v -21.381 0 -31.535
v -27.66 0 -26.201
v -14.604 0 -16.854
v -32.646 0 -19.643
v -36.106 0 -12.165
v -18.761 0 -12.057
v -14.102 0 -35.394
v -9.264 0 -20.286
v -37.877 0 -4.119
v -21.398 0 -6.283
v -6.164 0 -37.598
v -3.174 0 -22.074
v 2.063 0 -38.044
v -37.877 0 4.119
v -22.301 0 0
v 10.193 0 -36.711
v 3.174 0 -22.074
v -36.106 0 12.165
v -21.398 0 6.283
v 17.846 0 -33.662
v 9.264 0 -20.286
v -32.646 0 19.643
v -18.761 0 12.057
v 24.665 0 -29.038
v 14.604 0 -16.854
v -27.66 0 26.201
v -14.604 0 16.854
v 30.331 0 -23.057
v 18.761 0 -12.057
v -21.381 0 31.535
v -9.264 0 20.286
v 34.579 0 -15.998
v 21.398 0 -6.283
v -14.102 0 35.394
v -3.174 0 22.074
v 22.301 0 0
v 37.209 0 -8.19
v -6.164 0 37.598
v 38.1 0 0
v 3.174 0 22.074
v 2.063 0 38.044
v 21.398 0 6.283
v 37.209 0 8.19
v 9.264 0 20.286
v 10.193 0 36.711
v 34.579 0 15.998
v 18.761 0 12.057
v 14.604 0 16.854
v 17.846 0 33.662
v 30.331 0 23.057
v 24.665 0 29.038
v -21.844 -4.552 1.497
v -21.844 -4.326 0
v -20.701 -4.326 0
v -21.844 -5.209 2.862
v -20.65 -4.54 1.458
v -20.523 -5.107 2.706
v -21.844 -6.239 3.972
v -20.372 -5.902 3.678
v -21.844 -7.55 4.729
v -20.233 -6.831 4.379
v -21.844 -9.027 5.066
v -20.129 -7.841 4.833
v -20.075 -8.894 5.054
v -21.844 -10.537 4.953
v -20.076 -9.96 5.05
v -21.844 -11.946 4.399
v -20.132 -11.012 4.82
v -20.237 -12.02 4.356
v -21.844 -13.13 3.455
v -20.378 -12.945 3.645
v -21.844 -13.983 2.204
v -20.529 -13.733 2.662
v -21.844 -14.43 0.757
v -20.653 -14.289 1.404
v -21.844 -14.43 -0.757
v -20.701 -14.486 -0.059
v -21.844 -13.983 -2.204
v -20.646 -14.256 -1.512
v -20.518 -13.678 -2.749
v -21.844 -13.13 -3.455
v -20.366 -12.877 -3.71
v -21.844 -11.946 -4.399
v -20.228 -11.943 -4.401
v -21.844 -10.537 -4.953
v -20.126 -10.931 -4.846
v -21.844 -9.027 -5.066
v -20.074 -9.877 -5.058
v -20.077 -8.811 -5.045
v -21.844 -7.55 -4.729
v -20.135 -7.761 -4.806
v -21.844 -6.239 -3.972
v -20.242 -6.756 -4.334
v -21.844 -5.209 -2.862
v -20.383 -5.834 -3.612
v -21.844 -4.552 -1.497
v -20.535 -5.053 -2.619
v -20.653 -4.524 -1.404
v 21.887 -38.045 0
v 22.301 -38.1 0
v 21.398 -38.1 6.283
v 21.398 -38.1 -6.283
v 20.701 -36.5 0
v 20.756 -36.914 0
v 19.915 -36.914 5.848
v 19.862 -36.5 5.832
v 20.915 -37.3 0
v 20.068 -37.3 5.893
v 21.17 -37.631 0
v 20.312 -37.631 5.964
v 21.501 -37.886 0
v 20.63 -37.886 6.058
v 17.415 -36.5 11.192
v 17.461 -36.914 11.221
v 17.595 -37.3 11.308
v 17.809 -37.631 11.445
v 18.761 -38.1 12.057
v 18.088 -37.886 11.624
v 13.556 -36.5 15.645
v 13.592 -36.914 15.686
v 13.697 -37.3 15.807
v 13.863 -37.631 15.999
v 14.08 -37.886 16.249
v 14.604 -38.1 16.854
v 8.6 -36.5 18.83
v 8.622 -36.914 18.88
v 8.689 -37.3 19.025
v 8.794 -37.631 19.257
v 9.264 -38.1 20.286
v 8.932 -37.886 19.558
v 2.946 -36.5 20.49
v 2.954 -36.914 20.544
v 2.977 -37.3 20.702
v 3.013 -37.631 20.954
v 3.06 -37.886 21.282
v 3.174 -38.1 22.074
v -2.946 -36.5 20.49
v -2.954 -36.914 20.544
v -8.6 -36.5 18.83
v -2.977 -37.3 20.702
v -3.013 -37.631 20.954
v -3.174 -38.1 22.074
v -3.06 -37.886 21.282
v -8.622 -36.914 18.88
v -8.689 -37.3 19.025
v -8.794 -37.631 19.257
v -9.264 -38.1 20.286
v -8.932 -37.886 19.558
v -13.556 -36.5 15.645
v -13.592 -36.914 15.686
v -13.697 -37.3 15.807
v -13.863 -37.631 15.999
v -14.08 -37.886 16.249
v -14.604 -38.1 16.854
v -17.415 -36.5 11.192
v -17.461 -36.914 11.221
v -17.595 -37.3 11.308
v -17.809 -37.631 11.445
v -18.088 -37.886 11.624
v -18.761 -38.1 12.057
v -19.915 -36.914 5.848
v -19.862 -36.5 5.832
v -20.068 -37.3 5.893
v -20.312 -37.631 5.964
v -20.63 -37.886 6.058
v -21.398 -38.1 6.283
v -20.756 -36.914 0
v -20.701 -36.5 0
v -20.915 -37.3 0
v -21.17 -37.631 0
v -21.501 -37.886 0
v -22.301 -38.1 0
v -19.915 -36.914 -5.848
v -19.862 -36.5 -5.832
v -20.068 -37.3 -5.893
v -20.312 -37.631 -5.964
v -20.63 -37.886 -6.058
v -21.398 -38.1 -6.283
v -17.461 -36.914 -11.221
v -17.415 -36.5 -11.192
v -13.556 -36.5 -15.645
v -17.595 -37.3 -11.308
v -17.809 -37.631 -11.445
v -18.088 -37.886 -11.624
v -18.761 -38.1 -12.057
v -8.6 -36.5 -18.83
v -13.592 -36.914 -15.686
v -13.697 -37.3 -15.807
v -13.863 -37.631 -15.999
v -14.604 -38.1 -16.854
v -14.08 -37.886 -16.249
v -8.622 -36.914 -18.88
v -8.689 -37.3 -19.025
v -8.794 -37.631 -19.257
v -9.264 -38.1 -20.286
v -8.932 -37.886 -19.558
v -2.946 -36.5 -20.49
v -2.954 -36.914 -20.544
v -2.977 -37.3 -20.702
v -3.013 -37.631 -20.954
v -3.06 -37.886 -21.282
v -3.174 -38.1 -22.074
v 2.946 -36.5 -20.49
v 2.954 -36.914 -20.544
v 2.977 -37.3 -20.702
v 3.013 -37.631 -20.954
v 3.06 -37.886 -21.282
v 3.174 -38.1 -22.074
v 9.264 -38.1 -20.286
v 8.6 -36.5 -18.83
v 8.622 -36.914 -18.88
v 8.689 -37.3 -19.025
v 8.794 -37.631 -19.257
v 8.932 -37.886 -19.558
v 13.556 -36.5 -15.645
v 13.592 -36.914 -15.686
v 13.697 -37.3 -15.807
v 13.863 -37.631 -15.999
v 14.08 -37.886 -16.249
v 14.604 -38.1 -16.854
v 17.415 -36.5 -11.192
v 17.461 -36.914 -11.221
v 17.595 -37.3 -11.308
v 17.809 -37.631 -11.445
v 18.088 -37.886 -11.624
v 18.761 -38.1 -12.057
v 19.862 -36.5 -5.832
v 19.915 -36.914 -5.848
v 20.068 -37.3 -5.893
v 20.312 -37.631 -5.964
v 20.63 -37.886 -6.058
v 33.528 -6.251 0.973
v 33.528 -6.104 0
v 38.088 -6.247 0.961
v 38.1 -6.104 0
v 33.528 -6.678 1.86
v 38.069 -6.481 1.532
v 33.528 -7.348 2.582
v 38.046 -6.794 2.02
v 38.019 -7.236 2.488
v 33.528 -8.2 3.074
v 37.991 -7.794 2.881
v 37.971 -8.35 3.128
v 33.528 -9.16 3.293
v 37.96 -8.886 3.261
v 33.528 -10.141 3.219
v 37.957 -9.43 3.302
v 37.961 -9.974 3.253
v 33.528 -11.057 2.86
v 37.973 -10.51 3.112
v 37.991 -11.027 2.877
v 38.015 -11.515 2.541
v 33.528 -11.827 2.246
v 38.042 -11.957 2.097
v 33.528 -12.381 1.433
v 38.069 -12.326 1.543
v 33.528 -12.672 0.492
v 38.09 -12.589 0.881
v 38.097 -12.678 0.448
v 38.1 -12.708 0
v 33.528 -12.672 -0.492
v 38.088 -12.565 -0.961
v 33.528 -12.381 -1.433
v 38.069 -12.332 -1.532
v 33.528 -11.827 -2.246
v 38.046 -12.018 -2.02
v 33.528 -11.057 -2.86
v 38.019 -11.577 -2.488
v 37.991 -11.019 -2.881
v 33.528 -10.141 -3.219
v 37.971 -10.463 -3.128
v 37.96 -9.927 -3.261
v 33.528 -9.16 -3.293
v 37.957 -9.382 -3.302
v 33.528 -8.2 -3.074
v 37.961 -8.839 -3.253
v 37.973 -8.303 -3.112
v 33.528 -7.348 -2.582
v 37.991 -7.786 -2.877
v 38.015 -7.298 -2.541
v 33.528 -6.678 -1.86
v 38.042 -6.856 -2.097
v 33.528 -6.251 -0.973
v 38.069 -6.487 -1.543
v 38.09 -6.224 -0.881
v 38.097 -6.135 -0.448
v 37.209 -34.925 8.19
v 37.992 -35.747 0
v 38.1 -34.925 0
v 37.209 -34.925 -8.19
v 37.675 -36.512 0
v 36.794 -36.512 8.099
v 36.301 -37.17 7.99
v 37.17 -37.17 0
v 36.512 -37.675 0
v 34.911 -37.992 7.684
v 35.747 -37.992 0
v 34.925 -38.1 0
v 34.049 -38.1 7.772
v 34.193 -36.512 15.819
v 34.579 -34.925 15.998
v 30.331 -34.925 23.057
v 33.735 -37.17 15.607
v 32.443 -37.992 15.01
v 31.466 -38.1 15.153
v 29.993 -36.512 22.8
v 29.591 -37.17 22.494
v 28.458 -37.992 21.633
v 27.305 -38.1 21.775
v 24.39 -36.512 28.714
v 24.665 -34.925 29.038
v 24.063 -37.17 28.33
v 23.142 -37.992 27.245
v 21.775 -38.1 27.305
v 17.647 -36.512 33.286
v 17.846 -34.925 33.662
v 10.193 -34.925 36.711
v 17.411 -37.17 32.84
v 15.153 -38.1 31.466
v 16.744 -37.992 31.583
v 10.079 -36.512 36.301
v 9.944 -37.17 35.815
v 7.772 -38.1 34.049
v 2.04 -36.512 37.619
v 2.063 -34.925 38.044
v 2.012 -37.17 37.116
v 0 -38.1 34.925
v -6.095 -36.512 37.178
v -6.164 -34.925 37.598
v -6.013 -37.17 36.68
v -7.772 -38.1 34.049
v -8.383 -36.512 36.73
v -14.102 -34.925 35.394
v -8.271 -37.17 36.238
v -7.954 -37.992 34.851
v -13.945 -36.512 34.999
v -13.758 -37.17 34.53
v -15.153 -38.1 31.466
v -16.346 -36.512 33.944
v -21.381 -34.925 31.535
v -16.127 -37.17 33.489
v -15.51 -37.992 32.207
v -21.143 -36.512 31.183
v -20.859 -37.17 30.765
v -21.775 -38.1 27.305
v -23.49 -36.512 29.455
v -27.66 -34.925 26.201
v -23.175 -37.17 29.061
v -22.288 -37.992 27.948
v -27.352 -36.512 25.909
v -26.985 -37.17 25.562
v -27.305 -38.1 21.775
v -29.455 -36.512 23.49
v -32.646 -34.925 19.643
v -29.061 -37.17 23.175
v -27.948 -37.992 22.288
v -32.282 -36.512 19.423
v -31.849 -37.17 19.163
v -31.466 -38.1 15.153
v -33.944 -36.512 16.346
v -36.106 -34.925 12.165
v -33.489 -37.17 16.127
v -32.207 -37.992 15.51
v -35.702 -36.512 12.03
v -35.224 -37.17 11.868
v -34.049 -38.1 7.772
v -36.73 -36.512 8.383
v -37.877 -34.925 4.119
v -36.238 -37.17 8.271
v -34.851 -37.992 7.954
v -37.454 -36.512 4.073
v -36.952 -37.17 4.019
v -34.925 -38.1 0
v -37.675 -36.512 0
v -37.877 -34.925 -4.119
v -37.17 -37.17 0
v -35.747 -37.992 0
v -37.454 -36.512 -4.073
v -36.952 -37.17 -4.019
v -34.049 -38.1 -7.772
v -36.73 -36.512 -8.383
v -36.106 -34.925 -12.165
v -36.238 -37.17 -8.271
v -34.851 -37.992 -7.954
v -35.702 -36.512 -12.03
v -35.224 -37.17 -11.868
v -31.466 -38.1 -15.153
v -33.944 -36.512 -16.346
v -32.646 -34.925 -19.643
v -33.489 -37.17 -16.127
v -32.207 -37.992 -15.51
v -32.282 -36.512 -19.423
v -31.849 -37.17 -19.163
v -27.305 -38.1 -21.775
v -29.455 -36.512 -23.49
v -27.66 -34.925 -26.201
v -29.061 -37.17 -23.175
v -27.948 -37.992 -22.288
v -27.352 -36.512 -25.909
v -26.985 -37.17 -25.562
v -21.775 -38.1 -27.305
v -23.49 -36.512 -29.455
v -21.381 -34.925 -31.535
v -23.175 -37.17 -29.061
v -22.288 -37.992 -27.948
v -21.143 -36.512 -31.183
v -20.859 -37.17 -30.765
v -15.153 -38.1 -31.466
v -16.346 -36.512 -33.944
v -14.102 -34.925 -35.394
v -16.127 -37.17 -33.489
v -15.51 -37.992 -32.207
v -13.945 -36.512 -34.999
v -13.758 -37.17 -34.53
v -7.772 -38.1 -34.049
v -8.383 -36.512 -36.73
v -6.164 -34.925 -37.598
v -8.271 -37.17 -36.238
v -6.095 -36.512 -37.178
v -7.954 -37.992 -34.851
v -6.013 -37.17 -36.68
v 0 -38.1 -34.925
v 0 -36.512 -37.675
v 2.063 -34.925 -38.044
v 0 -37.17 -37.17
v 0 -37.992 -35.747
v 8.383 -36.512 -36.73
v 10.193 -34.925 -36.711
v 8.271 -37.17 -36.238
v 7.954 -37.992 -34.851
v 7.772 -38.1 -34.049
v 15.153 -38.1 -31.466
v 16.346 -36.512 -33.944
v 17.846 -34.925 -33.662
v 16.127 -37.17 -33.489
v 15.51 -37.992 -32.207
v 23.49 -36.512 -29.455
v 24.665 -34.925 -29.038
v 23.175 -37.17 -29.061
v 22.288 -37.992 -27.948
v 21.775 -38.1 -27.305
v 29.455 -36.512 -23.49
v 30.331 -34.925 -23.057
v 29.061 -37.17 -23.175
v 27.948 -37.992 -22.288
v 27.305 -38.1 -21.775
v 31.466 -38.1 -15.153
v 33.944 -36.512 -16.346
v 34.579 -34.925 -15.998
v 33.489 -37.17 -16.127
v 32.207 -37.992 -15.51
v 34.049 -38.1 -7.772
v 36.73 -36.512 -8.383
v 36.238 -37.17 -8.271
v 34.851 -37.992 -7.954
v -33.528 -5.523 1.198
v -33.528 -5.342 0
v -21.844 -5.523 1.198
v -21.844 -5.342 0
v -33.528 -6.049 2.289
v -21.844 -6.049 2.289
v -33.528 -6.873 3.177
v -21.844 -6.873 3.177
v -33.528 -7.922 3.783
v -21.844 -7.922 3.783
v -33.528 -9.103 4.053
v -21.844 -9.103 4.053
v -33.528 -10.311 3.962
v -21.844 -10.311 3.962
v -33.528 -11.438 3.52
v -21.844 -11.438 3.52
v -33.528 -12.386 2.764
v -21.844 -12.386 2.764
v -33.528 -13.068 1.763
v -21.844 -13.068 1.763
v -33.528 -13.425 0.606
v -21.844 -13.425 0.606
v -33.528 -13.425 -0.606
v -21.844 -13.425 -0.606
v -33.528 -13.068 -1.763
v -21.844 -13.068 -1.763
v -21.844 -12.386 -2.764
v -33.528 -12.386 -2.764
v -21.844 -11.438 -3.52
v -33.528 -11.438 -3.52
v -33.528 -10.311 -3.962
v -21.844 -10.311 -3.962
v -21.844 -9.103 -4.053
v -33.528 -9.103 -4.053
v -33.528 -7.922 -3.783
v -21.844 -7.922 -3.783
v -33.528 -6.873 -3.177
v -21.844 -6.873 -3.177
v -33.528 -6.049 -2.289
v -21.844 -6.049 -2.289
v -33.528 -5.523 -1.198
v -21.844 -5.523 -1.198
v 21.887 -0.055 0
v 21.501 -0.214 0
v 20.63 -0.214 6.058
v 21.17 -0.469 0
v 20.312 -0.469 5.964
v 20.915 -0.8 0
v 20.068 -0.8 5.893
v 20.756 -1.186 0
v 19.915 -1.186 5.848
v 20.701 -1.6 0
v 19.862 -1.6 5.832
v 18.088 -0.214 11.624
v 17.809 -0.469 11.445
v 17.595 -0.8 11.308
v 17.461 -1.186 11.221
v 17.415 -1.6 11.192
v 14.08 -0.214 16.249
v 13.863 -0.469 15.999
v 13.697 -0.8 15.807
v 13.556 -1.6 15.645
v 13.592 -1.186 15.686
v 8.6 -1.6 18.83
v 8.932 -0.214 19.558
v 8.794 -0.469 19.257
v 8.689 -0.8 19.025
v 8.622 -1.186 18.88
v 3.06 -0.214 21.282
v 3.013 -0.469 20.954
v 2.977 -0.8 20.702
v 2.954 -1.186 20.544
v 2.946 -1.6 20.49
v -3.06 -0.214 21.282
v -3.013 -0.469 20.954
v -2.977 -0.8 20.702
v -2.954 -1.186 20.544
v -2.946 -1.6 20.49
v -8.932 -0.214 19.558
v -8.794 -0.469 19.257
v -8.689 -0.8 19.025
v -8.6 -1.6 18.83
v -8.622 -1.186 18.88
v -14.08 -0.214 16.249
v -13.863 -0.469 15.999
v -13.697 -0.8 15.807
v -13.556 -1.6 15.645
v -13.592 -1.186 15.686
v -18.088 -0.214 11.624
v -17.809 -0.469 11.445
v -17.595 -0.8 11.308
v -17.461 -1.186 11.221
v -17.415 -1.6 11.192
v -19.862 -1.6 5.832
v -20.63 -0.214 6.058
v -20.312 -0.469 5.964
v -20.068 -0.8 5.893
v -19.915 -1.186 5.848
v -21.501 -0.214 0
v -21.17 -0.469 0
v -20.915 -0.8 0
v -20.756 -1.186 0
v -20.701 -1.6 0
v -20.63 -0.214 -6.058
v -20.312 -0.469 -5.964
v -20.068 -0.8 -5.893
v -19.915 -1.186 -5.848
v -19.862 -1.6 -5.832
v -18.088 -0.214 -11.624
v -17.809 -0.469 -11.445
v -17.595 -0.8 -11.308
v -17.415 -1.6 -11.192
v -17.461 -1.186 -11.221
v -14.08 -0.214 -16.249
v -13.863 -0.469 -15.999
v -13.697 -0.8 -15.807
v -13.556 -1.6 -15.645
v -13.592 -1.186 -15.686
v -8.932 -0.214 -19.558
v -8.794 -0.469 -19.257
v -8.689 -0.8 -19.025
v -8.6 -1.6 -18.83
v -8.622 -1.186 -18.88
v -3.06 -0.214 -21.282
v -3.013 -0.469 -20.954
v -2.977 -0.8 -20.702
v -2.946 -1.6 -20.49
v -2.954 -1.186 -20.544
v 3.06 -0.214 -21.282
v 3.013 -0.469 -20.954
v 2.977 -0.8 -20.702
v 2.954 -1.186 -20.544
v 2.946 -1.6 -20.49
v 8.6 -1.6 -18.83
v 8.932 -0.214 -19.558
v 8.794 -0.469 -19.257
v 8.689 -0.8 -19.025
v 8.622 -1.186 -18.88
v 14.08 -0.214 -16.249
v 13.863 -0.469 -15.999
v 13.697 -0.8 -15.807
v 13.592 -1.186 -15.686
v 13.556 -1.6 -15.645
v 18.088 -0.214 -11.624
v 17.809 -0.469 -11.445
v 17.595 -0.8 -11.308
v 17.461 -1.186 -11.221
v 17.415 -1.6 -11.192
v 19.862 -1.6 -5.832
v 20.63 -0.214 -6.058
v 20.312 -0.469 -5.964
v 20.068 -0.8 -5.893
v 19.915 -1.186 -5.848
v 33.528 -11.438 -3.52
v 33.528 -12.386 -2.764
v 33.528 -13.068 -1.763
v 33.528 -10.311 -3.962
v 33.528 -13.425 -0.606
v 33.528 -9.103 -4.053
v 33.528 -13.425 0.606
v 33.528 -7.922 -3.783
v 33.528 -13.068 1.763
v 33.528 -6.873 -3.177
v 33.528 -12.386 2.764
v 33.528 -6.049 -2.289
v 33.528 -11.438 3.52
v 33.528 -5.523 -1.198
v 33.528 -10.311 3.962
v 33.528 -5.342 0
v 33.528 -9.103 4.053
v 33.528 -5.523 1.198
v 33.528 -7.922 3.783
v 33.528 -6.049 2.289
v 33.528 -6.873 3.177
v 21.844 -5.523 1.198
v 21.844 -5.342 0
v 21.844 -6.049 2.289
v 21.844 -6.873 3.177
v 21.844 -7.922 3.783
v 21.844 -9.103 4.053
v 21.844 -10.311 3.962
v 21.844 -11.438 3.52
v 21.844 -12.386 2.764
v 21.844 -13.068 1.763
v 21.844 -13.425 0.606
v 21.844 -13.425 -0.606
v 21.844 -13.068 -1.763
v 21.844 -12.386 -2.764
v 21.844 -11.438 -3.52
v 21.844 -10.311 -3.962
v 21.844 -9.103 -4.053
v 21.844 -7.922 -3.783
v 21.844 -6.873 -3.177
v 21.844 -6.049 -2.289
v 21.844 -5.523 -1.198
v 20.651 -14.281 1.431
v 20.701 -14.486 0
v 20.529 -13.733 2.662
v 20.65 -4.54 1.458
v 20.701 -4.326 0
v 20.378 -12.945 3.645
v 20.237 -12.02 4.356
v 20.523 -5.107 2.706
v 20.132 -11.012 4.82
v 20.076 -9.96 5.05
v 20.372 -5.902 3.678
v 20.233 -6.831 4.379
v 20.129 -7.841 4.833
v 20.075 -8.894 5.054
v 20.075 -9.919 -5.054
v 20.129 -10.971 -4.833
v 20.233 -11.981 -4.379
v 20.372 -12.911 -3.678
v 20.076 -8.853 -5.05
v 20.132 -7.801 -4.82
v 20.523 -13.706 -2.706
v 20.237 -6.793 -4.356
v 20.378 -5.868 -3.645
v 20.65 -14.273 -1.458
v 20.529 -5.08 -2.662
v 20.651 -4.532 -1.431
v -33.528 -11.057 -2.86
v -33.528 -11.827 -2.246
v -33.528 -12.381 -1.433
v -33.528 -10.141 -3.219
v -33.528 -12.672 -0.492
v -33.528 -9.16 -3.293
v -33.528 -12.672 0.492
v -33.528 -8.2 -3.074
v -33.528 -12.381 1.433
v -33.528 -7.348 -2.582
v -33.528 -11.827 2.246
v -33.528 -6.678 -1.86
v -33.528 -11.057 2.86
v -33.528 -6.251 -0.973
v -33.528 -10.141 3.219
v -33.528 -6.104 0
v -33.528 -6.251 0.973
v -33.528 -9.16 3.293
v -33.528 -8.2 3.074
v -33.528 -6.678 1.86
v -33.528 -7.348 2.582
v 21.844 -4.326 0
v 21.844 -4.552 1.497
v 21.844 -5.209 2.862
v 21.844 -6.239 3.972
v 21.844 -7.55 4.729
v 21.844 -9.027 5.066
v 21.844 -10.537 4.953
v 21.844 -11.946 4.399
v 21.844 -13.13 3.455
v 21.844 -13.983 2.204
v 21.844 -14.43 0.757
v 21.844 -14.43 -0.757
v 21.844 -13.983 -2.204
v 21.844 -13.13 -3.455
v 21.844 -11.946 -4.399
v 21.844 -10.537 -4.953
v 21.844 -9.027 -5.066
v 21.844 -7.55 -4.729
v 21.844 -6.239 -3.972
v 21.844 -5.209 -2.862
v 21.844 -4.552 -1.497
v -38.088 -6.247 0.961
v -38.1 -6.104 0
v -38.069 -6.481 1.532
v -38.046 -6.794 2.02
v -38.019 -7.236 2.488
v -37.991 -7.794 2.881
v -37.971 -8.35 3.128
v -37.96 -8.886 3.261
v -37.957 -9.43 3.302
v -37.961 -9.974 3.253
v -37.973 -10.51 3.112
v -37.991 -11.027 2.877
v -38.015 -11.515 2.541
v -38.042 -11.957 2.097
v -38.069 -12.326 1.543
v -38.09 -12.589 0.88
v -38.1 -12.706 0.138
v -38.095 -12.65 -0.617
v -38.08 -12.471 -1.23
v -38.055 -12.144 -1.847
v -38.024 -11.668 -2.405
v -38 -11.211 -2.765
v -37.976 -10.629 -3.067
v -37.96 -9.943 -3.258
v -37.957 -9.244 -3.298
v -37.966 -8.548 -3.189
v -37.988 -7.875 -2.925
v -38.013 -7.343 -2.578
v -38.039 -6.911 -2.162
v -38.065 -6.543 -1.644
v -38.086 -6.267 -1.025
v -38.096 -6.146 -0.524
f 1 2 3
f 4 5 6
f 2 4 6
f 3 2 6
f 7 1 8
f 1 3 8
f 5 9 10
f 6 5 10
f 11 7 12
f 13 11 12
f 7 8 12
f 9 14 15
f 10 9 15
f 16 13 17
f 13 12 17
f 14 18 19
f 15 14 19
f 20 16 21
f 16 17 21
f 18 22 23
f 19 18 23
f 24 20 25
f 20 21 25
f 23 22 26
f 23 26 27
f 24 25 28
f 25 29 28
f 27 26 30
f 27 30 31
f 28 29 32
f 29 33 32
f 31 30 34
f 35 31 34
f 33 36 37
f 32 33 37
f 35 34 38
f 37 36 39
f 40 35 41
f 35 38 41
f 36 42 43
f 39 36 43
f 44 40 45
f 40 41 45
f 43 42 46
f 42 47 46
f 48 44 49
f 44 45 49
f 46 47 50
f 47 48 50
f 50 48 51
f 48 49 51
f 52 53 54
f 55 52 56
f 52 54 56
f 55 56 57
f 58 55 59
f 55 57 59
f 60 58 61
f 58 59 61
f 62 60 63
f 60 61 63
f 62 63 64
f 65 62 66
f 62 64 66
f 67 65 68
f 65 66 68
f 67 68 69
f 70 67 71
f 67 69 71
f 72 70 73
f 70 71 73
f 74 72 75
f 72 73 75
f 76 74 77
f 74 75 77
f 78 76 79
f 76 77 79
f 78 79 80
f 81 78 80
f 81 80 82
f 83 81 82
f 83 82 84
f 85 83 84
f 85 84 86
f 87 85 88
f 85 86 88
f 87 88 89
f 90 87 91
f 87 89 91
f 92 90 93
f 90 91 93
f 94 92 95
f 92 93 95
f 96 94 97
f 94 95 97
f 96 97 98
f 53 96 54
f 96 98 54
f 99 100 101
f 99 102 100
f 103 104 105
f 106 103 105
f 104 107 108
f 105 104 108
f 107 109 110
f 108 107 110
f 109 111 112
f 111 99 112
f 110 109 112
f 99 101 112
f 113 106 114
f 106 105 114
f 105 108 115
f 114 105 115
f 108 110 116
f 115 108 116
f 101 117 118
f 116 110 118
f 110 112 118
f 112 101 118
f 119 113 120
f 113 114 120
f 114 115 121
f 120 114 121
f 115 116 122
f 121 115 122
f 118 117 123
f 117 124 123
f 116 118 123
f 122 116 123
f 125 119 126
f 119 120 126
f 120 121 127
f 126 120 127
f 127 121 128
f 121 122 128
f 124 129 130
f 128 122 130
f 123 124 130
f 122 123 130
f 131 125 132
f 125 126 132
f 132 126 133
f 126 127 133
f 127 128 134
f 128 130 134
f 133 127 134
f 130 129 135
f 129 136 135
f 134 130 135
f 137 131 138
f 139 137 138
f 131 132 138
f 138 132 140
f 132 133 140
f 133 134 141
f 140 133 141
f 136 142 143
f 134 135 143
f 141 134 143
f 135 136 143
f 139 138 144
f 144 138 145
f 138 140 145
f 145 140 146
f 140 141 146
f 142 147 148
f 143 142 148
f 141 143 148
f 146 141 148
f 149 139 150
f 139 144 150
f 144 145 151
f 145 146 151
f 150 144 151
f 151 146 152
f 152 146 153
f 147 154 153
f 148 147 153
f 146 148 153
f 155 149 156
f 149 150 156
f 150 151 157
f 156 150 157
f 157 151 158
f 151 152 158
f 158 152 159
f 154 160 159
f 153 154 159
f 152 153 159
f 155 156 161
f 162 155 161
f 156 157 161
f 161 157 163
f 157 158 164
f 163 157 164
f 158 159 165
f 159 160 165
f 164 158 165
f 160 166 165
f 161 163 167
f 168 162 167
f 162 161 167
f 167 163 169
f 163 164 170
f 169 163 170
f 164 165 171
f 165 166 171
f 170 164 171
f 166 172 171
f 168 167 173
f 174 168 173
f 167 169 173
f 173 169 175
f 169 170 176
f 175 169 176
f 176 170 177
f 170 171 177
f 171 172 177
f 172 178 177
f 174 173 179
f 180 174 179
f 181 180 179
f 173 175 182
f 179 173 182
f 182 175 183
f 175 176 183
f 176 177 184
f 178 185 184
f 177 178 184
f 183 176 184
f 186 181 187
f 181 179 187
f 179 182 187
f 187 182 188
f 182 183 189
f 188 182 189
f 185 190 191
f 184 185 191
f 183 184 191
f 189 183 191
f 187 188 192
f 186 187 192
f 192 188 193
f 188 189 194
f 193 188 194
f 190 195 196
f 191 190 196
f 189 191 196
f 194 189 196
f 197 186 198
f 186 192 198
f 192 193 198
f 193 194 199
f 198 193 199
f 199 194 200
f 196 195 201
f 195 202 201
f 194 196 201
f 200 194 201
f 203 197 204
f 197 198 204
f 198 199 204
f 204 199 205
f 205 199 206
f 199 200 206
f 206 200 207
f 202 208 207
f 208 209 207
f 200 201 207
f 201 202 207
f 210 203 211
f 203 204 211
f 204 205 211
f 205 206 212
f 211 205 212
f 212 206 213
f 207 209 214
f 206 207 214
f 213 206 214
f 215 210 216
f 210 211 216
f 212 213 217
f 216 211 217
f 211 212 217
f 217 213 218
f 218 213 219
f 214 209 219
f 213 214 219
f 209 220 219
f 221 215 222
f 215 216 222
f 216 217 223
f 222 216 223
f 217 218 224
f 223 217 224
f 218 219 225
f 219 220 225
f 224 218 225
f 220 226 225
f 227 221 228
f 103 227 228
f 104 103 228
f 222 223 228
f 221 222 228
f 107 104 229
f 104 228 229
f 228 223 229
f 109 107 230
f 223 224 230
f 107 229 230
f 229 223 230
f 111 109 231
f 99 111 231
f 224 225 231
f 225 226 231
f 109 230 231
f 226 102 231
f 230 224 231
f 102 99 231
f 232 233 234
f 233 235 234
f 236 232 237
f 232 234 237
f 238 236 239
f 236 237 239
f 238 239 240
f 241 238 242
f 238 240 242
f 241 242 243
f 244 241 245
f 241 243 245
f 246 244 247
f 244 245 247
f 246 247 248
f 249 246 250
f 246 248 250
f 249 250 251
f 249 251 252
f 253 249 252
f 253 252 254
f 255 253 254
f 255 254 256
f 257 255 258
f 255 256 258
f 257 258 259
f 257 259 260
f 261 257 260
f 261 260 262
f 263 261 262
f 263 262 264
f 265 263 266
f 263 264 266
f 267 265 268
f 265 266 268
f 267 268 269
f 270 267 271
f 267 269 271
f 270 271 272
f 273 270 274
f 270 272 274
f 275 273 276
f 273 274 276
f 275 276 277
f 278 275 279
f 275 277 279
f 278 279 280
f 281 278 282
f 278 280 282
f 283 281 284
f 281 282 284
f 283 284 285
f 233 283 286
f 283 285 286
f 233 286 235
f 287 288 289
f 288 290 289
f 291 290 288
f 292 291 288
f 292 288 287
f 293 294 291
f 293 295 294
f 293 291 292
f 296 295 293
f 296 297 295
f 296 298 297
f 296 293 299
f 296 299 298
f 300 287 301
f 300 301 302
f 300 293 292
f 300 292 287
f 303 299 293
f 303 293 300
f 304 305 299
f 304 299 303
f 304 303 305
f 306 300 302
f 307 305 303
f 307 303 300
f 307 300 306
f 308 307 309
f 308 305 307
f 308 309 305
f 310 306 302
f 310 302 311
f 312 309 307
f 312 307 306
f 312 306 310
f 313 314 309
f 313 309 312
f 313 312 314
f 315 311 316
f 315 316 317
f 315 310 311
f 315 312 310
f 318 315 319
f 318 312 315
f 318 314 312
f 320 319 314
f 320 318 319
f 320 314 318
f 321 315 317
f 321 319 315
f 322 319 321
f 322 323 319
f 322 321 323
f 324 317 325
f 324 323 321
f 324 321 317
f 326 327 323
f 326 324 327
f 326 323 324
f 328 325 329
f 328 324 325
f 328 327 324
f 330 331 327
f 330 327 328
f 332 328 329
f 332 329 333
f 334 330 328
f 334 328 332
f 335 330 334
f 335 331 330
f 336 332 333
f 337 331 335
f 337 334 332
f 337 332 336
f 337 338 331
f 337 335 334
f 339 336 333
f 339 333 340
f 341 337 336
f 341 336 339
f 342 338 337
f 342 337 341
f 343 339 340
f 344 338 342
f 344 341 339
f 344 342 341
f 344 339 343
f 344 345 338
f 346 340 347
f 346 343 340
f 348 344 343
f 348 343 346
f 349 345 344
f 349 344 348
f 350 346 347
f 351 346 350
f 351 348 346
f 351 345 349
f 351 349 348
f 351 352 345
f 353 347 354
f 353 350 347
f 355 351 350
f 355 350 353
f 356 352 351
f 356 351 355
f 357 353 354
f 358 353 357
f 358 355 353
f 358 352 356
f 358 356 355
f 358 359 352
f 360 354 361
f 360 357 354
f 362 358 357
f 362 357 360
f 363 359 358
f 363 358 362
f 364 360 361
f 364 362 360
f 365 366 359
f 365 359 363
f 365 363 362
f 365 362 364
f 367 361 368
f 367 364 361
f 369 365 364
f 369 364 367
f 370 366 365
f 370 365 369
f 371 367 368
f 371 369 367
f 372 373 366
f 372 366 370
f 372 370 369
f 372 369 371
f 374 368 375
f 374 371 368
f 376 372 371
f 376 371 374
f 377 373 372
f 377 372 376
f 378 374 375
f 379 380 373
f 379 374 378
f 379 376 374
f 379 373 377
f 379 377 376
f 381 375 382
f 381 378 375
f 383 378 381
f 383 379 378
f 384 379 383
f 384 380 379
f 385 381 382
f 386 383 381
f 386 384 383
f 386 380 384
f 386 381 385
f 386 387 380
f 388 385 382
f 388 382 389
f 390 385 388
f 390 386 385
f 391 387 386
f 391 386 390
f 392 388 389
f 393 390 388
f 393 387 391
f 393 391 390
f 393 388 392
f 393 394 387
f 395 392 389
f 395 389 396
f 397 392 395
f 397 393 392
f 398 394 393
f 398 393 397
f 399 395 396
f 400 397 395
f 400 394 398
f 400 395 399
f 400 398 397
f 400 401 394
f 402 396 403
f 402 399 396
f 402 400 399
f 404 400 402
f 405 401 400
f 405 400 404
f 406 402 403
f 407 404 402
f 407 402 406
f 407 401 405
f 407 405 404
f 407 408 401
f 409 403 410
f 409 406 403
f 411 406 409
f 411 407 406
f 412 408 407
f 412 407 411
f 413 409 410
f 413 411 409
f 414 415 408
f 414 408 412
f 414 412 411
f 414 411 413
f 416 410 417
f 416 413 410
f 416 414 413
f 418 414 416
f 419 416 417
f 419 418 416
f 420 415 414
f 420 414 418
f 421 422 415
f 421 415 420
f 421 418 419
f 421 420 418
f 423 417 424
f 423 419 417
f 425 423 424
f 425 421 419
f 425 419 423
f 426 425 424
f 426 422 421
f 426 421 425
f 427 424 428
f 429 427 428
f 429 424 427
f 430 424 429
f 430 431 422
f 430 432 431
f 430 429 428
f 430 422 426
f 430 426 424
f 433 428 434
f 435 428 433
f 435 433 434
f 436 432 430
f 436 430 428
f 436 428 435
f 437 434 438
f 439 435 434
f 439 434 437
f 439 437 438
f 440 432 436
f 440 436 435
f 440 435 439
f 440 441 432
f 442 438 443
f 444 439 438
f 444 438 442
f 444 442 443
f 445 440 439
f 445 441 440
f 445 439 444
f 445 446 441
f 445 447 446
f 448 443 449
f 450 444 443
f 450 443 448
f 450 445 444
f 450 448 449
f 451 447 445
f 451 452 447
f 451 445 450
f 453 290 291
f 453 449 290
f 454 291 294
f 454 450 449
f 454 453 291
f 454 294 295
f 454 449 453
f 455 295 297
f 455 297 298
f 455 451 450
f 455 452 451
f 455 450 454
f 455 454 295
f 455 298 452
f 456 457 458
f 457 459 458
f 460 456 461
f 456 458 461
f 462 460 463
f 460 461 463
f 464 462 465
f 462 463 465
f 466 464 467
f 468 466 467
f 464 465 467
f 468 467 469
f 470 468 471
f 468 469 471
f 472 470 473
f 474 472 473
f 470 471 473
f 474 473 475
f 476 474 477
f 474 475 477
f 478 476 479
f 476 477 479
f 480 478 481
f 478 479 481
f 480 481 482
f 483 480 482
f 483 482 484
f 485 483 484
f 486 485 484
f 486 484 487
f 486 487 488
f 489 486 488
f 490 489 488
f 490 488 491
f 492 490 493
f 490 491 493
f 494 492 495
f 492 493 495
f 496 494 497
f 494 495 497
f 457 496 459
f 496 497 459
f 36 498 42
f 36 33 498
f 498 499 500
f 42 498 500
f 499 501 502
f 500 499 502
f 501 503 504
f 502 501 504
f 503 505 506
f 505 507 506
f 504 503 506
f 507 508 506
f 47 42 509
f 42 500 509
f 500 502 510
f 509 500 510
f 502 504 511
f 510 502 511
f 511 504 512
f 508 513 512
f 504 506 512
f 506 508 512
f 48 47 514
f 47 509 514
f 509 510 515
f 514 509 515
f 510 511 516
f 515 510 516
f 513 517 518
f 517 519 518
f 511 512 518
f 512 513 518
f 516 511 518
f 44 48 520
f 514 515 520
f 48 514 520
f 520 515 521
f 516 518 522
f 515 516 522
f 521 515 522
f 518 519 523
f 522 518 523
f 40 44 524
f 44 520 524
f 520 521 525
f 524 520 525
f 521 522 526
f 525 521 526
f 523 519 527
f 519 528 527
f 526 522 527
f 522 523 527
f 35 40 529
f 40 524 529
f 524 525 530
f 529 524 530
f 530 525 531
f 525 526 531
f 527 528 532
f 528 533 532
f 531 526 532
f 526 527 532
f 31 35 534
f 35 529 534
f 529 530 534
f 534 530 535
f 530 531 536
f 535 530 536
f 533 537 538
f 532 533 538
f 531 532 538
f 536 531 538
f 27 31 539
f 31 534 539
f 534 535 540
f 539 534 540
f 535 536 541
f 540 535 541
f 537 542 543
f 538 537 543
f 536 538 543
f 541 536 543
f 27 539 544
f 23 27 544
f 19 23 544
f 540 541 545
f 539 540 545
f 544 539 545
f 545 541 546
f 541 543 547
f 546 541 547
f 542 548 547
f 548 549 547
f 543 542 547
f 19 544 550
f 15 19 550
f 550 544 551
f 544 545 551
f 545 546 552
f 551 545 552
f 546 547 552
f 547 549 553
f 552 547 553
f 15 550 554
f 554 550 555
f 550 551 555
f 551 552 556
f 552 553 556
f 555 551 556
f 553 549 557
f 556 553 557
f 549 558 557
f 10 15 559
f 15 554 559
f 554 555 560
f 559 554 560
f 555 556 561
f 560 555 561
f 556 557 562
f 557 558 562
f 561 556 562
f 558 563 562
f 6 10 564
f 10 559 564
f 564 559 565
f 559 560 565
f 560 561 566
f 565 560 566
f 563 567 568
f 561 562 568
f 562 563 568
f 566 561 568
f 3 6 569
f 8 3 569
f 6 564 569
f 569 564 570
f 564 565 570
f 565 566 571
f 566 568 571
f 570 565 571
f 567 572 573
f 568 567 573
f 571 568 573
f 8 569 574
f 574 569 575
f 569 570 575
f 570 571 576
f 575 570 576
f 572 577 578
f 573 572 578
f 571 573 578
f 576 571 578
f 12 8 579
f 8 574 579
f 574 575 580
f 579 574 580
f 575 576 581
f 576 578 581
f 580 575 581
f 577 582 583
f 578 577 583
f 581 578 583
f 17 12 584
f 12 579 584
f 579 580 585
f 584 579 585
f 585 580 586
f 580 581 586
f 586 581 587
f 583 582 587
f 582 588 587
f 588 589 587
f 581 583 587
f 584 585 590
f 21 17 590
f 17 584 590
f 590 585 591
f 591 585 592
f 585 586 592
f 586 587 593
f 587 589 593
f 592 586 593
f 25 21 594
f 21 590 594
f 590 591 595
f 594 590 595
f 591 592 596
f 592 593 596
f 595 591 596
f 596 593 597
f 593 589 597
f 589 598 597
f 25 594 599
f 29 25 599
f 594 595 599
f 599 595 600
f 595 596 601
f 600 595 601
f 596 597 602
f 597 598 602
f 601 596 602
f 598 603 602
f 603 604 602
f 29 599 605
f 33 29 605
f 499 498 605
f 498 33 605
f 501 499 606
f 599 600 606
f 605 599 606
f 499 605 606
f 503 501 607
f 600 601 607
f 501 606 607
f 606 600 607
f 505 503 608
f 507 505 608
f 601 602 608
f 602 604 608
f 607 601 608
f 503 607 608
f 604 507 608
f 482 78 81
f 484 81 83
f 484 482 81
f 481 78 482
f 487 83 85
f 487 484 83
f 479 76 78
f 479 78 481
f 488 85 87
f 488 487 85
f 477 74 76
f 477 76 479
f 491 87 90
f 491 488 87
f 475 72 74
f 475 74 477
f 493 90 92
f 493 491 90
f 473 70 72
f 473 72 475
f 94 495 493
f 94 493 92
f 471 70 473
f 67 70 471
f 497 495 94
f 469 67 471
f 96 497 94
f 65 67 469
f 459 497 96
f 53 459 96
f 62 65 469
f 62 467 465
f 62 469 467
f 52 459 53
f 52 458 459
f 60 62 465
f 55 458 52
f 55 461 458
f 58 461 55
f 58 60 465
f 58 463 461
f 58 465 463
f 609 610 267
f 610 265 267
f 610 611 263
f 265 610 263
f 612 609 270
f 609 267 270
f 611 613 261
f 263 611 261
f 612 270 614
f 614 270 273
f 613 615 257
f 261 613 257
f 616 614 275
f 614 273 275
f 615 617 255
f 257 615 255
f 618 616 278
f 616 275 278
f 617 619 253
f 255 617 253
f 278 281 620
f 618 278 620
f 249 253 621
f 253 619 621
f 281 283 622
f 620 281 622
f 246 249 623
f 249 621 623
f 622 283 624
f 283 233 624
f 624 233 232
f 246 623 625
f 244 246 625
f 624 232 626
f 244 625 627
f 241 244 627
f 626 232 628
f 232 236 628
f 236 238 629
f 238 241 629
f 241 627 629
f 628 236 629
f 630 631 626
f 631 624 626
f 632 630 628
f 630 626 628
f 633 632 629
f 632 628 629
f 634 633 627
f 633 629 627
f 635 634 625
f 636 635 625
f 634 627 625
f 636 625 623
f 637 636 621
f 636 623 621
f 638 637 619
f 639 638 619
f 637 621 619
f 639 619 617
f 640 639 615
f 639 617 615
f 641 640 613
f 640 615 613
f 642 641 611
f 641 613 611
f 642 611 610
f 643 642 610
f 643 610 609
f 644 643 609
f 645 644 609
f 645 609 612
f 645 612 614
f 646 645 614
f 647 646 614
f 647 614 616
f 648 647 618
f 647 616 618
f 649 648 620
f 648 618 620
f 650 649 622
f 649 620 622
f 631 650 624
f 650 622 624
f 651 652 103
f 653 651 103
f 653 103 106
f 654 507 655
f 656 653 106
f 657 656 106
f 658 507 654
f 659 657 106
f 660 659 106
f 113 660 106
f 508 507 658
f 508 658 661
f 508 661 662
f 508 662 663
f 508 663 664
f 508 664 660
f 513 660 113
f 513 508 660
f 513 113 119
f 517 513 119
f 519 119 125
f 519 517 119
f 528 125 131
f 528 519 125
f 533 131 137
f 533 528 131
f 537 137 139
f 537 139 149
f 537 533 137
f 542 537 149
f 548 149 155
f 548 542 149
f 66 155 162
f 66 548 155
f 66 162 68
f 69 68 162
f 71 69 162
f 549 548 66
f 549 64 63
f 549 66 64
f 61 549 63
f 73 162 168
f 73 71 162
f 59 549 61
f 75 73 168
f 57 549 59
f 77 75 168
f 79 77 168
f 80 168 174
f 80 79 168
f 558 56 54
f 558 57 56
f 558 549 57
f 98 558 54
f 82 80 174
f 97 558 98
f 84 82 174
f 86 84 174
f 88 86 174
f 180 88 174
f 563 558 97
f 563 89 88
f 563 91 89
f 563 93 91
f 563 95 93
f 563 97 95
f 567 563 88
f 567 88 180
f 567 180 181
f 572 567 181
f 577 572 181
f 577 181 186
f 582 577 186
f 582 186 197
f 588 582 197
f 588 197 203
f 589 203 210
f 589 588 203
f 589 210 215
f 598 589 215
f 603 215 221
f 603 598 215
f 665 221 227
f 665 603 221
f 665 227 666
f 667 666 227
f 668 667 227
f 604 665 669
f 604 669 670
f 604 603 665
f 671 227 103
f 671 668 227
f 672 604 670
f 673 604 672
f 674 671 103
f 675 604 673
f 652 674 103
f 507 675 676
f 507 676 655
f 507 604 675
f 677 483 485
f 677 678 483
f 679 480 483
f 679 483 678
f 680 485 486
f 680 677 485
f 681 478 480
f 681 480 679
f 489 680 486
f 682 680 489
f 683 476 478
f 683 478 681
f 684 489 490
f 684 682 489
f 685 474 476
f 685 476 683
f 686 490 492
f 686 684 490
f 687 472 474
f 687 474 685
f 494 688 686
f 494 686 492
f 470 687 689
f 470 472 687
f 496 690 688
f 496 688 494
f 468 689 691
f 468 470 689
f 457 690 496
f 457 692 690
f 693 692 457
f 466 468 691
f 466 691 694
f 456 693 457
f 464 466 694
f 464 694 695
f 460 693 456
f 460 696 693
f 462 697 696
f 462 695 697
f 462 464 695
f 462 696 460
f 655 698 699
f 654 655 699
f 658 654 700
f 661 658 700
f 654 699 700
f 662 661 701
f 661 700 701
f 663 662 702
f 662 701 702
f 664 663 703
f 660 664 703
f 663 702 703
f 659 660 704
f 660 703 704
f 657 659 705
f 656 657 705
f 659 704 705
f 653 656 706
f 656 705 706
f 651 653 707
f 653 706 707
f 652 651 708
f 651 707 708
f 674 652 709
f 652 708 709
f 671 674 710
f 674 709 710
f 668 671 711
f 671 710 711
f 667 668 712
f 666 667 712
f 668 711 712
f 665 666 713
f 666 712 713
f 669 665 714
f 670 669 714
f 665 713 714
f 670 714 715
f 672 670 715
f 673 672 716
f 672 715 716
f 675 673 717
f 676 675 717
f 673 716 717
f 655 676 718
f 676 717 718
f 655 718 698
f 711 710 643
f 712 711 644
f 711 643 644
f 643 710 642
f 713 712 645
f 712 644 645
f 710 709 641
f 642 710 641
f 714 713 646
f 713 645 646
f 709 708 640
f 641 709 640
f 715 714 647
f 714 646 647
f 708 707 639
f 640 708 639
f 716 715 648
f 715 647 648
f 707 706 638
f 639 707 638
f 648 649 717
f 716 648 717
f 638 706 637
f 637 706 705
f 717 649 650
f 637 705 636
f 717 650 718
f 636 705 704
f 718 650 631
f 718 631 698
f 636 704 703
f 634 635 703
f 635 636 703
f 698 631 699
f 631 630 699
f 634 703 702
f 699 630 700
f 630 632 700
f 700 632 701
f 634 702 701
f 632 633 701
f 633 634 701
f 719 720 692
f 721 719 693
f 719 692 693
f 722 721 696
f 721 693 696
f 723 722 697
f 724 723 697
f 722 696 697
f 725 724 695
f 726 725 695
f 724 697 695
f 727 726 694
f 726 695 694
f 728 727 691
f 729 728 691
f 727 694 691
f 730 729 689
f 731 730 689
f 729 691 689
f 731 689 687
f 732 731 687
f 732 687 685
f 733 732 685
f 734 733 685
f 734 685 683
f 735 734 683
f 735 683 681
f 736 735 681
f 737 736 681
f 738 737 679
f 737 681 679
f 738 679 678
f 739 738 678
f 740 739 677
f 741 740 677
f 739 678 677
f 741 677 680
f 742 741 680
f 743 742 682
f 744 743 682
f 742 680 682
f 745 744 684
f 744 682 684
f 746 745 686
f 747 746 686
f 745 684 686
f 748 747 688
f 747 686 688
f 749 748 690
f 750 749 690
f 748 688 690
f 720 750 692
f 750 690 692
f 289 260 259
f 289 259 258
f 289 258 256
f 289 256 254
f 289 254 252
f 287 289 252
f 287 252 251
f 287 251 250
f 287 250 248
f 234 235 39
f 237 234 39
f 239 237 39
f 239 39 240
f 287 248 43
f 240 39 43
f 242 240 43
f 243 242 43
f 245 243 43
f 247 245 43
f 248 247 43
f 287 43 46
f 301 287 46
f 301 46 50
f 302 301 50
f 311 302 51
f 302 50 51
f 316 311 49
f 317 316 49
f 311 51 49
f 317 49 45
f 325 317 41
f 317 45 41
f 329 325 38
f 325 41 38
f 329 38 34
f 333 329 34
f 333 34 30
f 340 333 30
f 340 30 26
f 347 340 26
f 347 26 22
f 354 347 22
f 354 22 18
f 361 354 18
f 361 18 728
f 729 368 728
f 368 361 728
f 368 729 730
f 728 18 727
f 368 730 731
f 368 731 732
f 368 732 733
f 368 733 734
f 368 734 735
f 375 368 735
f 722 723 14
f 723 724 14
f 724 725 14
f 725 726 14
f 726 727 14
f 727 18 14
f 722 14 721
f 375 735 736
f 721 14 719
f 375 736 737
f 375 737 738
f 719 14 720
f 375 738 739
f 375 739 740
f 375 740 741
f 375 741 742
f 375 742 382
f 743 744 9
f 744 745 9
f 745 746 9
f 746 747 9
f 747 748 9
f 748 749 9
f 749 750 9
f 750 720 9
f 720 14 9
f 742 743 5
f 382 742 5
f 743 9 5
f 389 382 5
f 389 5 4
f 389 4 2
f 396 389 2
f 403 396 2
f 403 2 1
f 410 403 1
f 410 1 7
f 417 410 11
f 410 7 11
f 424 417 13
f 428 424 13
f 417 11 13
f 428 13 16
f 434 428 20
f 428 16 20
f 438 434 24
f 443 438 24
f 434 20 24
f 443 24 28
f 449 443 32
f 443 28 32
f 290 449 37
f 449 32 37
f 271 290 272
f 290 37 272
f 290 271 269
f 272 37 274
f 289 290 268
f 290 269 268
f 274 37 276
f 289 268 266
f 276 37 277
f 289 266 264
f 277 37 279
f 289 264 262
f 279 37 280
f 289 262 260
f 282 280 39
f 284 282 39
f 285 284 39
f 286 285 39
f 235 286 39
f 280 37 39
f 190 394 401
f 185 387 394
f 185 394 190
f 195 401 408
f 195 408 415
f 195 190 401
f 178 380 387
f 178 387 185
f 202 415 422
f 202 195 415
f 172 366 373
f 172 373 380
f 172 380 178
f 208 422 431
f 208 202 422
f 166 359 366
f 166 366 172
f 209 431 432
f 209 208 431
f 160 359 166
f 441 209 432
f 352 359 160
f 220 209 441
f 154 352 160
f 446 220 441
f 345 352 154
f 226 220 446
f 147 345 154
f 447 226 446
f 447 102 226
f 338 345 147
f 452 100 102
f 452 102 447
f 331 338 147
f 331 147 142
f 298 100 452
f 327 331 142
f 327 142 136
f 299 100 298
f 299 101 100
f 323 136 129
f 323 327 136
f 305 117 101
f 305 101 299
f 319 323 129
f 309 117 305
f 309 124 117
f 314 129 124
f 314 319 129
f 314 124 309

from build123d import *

# Parameters (mm, degrees)
F0_R     = 38.1
F0_R_2   = 20.701
F1_DEPTH = 38.1
F2_R     = 3.175
F3_R     = 3.302
F4_DEPTH = 50.8
F3_R_2   = 4.064
F5_DEPTH = 33.528
F3_R_3   = 5.08
F6_DEPTH = 21.844
F7_R     = 1.6002


with BuildPart() as f1:
    # F0 (on Front) → F1 (new body)
    with BuildSketch(Plane.XZ):
        Circle(F0_R)
        Circle(F0_R_2, mode=Mode.SUBTRACT)
    extrude(amount=F1_DEPTH)

    # F2
    f2_edges = [f1.edges().sort_by_distance(p)[0] for p in [
        (-38.1, -38.1, 0),
    ]]
    fillet(f2_edges, radius=F2_R)

    # F3 (on Right) → F4 (cut, symmetric)
    with BuildSketch(Plane.YZ):
        with Locations((-9.406389, 0)):
            Circle(F3_R)
    extrude(amount=F4_DEPTH, both=True, mode=Mode.SUBTRACT)

    # F3 (on Right) → F5 (cut, symmetric)
    with BuildSketch(Plane.YZ):
        with Locations((-9.406389, 0)):
            Circle(F3_R_2)
        with Locations((-9.406389, 0)):
            Circle(F3_R, mode=Mode.SUBTRACT)
    extrude(amount=F5_DEPTH, both=True, mode=Mode.SUBTRACT)

    # F3 (on Right) → F6 (cut, symmetric)
    with BuildSketch(Plane.YZ):
        with Locations((-9.406389, 0)):
            Circle(F3_R_3)
        with Locations((-9.406389, 0)):
            Circle(F3_R_2, mode=Mode.SUBTRACT)
    extrude(amount=F6_DEPTH, both=True, mode=Mode.SUBTRACT)

    # F7
    f7_edges = [f1.edges().sort_by_distance(p)[0] for p in [
        (-20.701, -38.1, 0),
        (-20.701, 0, 0),
    ]]
    fillet(f7_edges, radius=F7_R)


solid = f1.part
